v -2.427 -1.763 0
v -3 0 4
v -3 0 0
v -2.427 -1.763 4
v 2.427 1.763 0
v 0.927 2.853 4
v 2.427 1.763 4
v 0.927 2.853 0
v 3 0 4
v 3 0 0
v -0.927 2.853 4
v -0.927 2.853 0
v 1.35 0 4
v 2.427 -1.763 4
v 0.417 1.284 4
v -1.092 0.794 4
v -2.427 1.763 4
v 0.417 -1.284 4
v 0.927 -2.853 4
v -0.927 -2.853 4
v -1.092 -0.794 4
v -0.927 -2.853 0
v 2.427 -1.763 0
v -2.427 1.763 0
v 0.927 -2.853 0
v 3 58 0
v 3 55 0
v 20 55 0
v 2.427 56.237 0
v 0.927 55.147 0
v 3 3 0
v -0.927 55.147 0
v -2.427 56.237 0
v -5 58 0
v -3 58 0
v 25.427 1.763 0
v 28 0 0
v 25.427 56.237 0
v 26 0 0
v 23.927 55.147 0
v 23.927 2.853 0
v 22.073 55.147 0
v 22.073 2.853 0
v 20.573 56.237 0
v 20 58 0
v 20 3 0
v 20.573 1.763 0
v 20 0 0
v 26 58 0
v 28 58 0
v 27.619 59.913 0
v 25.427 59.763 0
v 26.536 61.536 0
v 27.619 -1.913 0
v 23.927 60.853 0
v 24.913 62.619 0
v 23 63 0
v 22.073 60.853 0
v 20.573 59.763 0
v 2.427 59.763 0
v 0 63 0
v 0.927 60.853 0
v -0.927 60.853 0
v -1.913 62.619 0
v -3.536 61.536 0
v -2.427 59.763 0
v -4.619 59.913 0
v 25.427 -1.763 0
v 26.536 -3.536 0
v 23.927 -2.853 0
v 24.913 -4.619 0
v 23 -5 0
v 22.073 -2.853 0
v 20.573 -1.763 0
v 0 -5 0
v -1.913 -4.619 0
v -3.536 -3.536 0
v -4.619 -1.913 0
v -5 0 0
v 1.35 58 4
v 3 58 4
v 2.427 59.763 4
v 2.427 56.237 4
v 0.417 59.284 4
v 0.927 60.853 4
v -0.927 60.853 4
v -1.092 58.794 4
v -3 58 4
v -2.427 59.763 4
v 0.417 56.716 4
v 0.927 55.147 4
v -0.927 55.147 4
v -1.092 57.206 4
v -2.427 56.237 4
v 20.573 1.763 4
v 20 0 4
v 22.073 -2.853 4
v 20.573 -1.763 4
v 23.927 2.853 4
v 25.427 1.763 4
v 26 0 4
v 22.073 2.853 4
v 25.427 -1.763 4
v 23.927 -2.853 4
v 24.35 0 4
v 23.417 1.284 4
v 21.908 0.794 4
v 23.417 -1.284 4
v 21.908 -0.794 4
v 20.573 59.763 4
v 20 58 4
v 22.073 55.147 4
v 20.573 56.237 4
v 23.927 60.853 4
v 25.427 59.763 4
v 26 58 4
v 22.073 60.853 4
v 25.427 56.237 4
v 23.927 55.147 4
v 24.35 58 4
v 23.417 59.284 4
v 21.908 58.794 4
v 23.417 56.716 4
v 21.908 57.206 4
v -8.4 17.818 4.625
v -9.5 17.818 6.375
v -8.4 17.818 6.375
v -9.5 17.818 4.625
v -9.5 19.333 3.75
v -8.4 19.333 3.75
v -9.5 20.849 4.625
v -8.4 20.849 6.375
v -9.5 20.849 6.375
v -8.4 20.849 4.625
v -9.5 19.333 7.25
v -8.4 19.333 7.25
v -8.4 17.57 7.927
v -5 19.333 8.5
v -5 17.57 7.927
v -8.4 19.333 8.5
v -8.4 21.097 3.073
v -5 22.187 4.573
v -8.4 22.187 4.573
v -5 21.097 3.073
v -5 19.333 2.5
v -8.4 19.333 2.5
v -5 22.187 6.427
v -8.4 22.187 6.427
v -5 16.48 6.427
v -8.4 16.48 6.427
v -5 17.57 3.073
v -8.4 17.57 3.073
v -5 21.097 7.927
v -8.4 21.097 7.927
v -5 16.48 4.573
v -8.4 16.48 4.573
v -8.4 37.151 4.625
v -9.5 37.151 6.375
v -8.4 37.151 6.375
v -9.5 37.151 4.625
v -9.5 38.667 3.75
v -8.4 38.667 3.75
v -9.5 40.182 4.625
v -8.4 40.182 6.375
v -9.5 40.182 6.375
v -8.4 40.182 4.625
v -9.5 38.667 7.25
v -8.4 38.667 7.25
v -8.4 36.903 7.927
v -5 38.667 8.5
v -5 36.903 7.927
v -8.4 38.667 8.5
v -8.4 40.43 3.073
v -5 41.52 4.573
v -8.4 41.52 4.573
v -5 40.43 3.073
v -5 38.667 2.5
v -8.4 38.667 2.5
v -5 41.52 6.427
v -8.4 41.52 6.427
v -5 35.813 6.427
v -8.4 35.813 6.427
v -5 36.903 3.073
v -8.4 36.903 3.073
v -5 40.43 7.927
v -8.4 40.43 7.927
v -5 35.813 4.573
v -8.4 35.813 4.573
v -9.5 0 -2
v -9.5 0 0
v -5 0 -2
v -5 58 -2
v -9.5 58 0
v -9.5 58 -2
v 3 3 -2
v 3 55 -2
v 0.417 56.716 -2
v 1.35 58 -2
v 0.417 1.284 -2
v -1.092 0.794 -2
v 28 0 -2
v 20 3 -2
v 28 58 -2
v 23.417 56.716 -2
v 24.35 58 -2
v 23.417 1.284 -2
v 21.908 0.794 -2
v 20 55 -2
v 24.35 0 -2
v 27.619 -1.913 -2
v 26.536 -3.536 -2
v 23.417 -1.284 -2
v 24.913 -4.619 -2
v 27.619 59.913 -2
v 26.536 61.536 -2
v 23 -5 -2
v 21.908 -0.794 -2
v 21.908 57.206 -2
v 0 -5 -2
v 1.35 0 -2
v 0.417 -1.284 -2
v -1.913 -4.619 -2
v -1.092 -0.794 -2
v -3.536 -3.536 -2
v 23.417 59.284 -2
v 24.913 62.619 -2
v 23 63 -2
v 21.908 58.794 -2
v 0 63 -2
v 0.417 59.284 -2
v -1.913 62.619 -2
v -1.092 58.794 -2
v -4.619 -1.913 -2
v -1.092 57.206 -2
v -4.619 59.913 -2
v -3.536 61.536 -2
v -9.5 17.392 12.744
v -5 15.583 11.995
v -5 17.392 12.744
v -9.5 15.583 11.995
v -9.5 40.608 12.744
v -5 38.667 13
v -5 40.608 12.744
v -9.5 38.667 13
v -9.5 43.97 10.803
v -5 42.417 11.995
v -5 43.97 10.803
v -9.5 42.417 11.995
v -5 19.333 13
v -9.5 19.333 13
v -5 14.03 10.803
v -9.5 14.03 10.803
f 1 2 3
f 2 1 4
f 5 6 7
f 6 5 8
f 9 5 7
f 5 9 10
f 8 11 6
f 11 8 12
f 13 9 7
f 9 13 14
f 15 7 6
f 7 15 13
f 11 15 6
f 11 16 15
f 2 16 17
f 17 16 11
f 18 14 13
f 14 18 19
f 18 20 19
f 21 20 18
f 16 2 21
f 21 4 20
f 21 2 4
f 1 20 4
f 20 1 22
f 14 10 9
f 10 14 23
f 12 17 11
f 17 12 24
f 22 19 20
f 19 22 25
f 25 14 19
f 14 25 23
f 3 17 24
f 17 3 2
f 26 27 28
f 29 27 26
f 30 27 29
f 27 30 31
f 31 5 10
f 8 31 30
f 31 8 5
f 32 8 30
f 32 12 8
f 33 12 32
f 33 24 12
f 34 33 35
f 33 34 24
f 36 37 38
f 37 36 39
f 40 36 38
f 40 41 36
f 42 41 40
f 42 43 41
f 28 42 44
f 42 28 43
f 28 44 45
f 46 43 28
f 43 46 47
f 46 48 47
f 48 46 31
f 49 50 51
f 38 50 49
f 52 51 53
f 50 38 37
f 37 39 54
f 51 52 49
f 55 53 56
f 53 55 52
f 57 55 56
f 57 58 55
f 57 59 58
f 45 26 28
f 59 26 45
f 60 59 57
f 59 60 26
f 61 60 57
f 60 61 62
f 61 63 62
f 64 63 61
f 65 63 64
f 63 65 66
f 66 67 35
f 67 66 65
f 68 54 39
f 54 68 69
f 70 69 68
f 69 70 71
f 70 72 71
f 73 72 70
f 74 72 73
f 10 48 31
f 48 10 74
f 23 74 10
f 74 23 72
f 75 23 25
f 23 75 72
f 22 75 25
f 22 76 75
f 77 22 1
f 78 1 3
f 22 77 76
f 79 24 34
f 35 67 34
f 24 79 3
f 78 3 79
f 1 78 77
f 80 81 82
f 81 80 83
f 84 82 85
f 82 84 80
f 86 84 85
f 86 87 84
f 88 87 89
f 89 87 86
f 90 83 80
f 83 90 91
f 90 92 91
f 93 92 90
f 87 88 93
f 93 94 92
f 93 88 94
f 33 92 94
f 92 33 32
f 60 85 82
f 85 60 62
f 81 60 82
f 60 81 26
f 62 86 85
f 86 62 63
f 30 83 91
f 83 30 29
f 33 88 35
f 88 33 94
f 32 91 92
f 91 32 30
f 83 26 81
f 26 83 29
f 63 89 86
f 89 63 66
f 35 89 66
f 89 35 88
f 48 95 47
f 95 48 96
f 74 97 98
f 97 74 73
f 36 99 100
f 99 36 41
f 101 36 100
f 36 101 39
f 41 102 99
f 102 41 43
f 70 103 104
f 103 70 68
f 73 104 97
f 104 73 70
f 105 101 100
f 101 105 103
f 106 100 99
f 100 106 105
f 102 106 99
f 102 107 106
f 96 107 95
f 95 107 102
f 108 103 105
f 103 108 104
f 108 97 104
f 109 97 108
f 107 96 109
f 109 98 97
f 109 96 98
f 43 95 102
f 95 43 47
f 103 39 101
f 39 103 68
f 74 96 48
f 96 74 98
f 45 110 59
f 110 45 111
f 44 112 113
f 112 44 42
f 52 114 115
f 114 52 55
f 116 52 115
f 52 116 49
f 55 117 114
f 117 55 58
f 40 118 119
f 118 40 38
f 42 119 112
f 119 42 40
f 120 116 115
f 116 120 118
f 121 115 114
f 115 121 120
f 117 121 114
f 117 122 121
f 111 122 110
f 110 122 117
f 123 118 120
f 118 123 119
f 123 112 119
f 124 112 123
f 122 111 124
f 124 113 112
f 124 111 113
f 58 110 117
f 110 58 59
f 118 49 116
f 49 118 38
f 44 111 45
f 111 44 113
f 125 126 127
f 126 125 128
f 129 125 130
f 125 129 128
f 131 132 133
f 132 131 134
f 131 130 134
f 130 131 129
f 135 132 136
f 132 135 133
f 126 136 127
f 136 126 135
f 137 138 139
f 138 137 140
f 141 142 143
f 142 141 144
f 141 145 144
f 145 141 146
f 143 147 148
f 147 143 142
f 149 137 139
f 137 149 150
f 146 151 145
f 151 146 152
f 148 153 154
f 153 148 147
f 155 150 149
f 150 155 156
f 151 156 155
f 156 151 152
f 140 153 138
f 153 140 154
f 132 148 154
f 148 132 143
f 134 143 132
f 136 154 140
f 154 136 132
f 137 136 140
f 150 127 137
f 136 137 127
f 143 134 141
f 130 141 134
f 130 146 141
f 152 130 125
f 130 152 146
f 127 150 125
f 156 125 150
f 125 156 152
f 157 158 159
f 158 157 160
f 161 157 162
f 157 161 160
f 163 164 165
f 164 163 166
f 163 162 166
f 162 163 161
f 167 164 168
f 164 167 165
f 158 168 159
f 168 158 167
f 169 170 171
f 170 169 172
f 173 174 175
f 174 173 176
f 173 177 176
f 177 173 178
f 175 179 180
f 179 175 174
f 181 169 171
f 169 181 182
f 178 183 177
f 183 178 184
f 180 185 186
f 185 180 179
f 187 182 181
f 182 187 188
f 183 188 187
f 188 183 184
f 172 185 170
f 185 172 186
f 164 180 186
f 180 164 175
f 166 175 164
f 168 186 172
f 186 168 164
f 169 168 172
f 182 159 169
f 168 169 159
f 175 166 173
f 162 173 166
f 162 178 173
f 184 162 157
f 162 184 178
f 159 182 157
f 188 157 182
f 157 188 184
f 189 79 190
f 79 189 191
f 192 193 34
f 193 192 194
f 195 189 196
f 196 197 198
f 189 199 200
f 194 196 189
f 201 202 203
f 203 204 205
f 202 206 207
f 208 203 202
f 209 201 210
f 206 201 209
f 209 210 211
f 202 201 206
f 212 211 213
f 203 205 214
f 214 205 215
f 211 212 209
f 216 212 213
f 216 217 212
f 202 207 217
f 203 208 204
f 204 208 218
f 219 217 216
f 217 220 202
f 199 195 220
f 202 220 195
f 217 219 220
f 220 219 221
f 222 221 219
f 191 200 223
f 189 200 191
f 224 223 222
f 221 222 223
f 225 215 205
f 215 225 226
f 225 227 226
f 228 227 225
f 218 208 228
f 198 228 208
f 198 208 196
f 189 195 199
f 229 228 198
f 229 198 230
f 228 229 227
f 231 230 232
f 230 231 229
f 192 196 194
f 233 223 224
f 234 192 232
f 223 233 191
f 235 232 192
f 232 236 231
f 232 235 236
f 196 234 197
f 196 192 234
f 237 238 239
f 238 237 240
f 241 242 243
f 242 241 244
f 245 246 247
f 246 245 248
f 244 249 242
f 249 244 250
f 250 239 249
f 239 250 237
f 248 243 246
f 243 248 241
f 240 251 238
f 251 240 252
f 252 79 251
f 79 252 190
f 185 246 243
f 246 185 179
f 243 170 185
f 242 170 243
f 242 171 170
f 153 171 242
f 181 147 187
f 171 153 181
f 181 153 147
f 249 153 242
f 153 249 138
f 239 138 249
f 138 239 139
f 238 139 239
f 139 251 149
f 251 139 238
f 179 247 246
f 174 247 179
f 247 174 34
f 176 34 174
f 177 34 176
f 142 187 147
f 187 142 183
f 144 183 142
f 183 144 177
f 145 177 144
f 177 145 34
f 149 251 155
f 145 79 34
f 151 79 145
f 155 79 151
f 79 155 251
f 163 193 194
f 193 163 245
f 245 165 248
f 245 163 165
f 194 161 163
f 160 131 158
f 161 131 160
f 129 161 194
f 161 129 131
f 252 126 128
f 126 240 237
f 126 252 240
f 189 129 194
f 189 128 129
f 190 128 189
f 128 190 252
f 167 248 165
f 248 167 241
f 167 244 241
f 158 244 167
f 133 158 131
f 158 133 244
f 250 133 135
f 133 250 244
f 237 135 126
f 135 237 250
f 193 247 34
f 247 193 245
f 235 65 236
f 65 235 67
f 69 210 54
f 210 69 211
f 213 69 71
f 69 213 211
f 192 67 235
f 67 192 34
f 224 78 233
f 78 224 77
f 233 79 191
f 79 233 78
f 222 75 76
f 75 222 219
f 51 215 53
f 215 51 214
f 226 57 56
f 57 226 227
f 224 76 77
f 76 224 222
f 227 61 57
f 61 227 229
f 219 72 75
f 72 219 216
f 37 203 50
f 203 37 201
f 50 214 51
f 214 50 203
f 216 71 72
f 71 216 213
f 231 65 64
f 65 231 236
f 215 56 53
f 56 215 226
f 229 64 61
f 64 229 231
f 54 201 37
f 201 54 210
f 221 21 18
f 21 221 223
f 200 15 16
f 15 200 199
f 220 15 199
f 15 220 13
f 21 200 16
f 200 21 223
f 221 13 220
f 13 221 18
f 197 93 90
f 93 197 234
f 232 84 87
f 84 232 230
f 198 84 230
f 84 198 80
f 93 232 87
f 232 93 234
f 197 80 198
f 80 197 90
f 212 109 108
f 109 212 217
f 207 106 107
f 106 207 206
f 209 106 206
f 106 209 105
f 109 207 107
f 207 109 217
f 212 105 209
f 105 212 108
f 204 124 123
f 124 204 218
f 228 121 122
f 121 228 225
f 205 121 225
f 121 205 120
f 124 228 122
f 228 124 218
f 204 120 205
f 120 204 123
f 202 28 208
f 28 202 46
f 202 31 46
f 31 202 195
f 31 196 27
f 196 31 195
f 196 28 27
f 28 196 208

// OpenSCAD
sh=4; //stub height
sd=6; //stub outer diameter
sid= 2.7;//stub inned diameter
od=5; //outer distance
br=5; //braket radius
id=-3; //inner distance
m3i=15; //M3 in (from the sides)
bh=4.5;   // bracket height
bbh=2;   //bottom bracket height

hp= [   
[0,0],
[0,58],
[23,0],
[23,58]
];  // holes position
    
    module roundedCube(d,r){
    hull(){
    translate([+r,+r,0]) cylinder(r=r,h=d[2]);
    translate([d[0]-r,+r,0]) cylinder(r=r,h=d[2]);
    translate([+r,d[1]-r,0]) cylinder(r=r,h=d[2]);
    translate([d[0]-r,d[1]-r,0]) cylinder(r=r,h=d[2]);
    }
    }
module hexM3screw (h){
   cylinder(d=3.5,h=h);
    translate([0,0,h-3.5])
        cylinder(d=6,h=3.5);
} 

module backet (S){
    holepos=[1/3,2/3];
    difference(){
        //cube(S);
        hull(){
            for (i = holepos){
                translate([0,S[1]*i,S[2]/2]) rotate([0,90,0])
                  cylinder(d=S[2],h=S[0]);
            }
            for (i=[0,S[1]-1]){
                translate ([0,i,0]) cube([S[0],1,bbh]);
            }
        }
        //bracet Holes
        for (i = holepos)  {
            translate([-1,S[1]*i,S[2]/2]) 
                rotate([0,90,0]) hexM3screw(h=S[0]+1.1);
        }
    }
}
    
module boardHull(hp, h, d=0,r=0){
    maxx = max([for (i=hp) i[0]]);
    maxy = max([for (i=hp) i[1]]);
    linear_extrude(height=h) 
        offset(r=r) offset(delta=d) 
            square([maxx,maxy]);
}
    
%translate([0,0,sh])boardHull(hp,1.5,r=3.5);
maxy = max([for (i=hp) i[1]]);
difference(){
    union(){
        translate([0,0,-bbh])
            boardHull(hp,bbh,od-br,br);
        for (p=hp){
            translate([p[0],p[1],0]) cylinder(d=sd,h=sh);
        }
        translate([-od-bh,-od+br,-bbh]) 
        backet([bh,maxy+od*2-2*br,m3i]);
    }
    // open bottom
    translate([0,0,-bbh-1])
        boardHull(hp,bbh+2,r=id);
    //passthrough holes
    for (p=hp){
        translate([p[0],p[1],-bbh-1]) cylinder(d=sid,h=sh+bbh+2);
    }
}
